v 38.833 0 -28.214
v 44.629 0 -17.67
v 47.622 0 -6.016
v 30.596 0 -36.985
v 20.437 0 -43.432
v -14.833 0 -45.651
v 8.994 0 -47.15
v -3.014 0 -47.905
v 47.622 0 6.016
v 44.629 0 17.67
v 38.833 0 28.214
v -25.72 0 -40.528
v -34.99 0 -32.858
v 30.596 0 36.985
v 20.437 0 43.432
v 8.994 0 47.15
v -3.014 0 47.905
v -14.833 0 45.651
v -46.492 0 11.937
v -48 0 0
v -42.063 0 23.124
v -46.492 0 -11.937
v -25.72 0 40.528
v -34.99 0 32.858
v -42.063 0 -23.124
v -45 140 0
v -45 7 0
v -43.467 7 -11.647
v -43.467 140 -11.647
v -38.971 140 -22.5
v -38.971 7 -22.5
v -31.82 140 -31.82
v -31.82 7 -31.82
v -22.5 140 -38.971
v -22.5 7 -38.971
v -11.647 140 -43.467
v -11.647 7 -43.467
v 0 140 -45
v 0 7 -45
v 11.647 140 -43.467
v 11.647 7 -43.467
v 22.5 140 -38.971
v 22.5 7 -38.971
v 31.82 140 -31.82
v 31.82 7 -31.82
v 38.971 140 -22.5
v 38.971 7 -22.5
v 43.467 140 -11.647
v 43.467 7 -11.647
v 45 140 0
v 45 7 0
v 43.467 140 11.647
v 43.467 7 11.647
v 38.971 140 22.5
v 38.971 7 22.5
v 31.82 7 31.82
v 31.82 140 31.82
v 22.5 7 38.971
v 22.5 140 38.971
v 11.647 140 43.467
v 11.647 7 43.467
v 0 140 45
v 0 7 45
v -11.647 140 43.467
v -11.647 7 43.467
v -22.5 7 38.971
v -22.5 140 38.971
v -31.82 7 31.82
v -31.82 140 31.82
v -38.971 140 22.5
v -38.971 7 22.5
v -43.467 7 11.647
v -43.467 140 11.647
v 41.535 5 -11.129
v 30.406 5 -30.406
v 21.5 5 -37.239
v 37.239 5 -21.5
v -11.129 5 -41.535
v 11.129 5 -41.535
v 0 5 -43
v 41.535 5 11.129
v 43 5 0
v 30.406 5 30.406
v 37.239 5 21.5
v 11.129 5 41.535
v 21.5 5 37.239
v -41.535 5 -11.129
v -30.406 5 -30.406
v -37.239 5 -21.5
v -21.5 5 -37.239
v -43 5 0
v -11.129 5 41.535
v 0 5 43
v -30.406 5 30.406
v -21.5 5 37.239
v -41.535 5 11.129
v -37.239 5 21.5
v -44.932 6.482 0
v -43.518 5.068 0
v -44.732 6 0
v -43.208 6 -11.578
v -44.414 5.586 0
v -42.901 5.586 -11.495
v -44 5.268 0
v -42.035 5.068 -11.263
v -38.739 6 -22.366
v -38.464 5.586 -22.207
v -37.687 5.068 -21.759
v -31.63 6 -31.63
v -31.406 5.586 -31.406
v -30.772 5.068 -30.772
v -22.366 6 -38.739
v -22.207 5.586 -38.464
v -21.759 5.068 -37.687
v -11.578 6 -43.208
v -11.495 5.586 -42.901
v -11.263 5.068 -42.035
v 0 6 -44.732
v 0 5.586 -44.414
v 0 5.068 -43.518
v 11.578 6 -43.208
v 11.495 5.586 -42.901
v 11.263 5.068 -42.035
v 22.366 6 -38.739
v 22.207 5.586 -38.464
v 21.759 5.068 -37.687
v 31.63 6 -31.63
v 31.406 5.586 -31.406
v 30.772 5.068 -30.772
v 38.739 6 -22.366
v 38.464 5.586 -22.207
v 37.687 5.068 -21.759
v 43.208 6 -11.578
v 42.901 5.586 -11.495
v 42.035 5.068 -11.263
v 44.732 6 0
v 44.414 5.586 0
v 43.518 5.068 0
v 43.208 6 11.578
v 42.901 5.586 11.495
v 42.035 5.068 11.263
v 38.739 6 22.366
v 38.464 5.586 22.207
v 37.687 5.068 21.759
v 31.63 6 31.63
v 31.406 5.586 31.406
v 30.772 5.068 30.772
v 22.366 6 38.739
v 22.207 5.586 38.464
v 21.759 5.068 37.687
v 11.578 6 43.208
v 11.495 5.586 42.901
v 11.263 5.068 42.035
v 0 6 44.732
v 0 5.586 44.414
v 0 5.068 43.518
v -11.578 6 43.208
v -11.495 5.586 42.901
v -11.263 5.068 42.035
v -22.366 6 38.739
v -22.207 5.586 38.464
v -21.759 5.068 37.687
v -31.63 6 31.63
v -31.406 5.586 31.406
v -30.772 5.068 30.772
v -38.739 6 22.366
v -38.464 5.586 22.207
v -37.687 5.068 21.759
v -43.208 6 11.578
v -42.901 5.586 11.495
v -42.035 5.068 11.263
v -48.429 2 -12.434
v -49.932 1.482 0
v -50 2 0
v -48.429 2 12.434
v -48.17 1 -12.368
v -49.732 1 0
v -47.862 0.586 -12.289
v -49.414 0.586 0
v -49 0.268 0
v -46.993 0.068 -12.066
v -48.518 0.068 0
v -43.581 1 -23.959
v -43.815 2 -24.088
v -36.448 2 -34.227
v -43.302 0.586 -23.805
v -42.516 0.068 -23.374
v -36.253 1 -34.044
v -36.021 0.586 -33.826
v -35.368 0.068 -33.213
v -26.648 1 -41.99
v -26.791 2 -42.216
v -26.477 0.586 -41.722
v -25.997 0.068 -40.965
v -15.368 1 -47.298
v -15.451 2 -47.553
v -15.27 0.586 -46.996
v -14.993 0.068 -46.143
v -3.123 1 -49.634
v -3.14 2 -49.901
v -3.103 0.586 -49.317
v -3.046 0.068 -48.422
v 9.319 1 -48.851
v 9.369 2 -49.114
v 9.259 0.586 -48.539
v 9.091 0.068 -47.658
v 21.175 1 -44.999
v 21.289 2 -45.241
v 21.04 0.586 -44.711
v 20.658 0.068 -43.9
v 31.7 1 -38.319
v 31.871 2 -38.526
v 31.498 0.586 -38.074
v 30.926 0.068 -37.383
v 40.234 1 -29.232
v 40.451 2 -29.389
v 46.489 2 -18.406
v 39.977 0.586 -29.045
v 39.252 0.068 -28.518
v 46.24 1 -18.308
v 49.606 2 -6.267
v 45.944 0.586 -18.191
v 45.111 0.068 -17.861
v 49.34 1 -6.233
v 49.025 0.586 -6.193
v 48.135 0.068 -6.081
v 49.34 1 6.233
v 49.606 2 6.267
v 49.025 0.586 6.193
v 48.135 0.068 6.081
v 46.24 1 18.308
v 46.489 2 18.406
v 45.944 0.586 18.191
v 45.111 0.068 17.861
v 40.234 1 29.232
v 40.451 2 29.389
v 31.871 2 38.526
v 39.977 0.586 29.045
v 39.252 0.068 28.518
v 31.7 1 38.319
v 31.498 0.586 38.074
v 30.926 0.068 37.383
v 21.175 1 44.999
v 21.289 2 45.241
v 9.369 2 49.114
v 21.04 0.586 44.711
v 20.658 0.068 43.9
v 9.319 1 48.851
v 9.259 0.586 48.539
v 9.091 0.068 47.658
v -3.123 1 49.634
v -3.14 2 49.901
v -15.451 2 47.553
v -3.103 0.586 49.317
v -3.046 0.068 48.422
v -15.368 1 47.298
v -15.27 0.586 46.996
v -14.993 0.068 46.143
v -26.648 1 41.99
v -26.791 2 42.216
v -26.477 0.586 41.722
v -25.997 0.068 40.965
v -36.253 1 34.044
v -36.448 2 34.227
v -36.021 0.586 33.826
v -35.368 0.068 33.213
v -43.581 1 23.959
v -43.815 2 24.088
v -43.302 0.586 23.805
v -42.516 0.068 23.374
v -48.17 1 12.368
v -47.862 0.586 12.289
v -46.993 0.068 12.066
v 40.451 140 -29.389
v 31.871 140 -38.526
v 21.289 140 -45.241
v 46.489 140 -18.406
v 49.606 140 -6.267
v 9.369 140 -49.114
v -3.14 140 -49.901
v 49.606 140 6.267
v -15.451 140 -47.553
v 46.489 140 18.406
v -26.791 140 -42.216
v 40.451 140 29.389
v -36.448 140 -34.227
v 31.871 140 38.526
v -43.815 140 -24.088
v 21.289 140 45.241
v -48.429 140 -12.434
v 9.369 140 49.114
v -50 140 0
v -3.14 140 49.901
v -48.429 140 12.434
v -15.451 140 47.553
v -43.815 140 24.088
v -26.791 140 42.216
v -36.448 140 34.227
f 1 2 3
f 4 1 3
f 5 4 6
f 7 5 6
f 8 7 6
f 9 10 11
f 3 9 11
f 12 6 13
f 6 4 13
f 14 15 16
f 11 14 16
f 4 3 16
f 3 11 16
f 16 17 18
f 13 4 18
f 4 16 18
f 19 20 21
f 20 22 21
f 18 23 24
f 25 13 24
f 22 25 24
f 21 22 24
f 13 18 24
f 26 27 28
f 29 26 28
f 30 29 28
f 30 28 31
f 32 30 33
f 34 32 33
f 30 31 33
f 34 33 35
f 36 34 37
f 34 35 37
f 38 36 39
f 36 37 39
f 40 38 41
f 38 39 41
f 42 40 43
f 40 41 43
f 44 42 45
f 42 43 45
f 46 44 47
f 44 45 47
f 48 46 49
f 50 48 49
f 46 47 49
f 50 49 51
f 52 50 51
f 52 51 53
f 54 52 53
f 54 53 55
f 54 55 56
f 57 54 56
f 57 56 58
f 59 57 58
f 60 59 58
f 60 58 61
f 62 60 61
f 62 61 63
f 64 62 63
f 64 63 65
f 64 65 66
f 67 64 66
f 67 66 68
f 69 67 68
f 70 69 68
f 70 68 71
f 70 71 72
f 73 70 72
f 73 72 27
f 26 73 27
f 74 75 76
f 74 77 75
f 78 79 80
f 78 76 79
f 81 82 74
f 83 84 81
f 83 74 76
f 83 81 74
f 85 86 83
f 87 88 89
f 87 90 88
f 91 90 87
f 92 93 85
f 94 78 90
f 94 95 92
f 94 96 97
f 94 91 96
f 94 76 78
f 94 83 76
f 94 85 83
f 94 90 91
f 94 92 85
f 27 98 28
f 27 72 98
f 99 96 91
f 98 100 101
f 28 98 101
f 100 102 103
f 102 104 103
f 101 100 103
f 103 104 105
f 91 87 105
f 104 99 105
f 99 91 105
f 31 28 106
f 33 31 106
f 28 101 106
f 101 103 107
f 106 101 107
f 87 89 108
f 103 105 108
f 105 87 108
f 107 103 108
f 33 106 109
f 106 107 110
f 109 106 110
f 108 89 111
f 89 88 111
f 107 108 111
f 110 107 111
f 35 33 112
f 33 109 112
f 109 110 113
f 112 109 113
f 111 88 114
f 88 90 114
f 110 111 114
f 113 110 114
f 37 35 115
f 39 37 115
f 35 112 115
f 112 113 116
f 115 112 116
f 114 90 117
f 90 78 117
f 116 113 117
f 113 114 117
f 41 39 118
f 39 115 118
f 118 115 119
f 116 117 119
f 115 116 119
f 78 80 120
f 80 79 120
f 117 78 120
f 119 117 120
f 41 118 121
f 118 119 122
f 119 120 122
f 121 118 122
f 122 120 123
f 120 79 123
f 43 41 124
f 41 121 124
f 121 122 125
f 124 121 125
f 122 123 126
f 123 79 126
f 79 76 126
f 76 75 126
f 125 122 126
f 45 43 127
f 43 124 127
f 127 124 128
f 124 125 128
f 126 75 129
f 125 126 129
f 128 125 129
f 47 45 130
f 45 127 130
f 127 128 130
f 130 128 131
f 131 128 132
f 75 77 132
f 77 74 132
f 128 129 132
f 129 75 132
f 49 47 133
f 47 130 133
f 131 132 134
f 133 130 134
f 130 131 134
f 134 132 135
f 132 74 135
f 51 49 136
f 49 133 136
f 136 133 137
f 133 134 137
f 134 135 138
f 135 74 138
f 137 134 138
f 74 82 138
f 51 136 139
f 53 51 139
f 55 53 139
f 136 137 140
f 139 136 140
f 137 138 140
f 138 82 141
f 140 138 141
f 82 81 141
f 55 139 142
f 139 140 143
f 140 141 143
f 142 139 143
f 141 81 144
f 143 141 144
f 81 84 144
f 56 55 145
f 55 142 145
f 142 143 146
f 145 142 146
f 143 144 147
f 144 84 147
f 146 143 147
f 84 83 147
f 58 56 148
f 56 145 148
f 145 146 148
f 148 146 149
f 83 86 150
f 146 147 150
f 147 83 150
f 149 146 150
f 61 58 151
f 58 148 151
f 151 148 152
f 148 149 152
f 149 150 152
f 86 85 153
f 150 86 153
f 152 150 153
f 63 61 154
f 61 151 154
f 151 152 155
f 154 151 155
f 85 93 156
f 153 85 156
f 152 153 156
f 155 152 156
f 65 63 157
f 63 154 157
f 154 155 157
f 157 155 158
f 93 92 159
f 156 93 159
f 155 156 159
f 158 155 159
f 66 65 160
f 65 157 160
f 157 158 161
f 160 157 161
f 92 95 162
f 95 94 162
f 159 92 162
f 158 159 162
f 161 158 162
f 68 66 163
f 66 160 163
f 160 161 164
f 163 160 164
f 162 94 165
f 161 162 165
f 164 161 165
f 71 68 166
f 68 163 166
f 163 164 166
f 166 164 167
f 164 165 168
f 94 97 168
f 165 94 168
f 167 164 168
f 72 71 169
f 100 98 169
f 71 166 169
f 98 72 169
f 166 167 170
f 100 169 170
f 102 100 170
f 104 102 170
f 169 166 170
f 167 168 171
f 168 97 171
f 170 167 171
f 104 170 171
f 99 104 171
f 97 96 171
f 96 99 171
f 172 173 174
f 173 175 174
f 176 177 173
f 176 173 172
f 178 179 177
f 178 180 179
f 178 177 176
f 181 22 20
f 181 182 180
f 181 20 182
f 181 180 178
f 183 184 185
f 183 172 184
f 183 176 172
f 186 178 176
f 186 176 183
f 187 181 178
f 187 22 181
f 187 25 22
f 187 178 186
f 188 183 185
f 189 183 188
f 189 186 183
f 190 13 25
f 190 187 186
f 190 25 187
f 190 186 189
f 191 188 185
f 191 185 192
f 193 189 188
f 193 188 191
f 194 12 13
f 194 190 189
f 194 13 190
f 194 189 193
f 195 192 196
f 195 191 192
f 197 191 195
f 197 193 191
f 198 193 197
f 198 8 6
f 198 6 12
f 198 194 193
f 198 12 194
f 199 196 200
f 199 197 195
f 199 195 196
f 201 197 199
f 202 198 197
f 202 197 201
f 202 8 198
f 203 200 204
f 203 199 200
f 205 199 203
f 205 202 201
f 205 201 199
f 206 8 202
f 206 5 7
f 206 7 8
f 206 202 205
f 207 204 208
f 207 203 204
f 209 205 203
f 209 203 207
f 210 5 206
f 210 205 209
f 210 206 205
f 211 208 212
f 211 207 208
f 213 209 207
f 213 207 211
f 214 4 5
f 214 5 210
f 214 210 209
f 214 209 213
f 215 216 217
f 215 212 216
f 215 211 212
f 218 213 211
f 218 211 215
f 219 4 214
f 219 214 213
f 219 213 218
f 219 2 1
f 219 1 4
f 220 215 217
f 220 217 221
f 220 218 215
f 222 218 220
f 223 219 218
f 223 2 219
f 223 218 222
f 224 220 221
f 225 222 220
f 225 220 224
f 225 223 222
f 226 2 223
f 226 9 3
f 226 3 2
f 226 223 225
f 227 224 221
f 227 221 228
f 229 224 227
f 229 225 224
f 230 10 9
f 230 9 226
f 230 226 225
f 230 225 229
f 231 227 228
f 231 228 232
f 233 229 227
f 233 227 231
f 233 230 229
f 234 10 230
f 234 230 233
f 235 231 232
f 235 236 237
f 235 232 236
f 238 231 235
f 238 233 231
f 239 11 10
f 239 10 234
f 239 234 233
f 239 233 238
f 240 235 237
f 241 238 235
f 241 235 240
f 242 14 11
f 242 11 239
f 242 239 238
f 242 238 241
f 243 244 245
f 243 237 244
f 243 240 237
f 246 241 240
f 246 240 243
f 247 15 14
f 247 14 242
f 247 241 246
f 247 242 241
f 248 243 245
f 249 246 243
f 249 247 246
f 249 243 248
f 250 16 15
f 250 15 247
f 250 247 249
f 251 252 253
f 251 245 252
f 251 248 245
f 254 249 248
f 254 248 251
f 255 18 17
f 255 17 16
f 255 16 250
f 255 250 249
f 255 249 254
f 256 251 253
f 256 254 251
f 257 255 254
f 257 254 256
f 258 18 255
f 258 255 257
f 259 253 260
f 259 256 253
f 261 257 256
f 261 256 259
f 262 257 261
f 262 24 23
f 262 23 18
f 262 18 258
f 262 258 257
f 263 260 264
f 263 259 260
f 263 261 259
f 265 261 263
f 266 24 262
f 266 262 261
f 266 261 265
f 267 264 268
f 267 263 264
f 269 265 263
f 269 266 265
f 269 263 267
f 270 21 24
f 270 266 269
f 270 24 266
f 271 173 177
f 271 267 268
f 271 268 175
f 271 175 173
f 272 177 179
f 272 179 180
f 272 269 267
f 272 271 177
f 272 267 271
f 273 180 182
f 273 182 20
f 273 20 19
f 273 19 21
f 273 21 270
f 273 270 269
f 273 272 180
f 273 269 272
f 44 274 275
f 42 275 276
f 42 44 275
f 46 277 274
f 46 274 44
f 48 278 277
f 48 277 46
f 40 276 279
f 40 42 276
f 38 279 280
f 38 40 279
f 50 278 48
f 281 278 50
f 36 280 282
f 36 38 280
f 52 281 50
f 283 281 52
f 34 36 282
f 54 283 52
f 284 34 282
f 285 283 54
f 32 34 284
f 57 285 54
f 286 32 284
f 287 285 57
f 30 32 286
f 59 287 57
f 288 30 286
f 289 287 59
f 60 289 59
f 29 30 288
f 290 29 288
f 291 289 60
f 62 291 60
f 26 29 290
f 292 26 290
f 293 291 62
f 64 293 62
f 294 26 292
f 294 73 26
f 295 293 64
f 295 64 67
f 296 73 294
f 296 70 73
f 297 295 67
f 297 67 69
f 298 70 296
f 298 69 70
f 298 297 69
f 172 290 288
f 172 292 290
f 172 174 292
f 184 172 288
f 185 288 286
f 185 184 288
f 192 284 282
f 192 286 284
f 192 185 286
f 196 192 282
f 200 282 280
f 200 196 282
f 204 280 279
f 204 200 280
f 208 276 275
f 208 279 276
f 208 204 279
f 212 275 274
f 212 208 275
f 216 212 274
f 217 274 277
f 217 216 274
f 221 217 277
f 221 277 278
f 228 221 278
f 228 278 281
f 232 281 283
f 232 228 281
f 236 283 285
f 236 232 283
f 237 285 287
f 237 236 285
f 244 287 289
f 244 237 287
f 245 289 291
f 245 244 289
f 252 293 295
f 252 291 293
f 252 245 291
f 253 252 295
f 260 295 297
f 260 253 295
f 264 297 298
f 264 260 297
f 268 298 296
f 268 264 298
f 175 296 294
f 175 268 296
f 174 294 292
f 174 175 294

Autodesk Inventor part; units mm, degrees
ref_plane "YZ Plane" through (0, 0, 0) normal (1, 0, 0) x (0, 1, 0)
ref_plane "XZ Plane" through (0, 0, 0) normal (0, 1, 0) x (-1, 0, 0)
ref_plane "XY Plane" through (0, 0, 0) normal (0, 0, 1) x (1, 0, 0)
sketch "Sketch1" plane through (0, 0, 0) normal (0, 1, 0) x (-1, 0, 0)
  circle A0 centre (0, 0) radius 50
  dimension "d0" = 100
extrude "Extrusion1" add sketch "Sketch1" along normal blind 140
shell "Shell1" thickness 5 removed faces 1 at (-9.39, 140, -8.8667)
fillet "Fillet1" radius 2 2 edges at (50, 0, 0) (45, 5, 0)
properties part number "Outer Layer"
